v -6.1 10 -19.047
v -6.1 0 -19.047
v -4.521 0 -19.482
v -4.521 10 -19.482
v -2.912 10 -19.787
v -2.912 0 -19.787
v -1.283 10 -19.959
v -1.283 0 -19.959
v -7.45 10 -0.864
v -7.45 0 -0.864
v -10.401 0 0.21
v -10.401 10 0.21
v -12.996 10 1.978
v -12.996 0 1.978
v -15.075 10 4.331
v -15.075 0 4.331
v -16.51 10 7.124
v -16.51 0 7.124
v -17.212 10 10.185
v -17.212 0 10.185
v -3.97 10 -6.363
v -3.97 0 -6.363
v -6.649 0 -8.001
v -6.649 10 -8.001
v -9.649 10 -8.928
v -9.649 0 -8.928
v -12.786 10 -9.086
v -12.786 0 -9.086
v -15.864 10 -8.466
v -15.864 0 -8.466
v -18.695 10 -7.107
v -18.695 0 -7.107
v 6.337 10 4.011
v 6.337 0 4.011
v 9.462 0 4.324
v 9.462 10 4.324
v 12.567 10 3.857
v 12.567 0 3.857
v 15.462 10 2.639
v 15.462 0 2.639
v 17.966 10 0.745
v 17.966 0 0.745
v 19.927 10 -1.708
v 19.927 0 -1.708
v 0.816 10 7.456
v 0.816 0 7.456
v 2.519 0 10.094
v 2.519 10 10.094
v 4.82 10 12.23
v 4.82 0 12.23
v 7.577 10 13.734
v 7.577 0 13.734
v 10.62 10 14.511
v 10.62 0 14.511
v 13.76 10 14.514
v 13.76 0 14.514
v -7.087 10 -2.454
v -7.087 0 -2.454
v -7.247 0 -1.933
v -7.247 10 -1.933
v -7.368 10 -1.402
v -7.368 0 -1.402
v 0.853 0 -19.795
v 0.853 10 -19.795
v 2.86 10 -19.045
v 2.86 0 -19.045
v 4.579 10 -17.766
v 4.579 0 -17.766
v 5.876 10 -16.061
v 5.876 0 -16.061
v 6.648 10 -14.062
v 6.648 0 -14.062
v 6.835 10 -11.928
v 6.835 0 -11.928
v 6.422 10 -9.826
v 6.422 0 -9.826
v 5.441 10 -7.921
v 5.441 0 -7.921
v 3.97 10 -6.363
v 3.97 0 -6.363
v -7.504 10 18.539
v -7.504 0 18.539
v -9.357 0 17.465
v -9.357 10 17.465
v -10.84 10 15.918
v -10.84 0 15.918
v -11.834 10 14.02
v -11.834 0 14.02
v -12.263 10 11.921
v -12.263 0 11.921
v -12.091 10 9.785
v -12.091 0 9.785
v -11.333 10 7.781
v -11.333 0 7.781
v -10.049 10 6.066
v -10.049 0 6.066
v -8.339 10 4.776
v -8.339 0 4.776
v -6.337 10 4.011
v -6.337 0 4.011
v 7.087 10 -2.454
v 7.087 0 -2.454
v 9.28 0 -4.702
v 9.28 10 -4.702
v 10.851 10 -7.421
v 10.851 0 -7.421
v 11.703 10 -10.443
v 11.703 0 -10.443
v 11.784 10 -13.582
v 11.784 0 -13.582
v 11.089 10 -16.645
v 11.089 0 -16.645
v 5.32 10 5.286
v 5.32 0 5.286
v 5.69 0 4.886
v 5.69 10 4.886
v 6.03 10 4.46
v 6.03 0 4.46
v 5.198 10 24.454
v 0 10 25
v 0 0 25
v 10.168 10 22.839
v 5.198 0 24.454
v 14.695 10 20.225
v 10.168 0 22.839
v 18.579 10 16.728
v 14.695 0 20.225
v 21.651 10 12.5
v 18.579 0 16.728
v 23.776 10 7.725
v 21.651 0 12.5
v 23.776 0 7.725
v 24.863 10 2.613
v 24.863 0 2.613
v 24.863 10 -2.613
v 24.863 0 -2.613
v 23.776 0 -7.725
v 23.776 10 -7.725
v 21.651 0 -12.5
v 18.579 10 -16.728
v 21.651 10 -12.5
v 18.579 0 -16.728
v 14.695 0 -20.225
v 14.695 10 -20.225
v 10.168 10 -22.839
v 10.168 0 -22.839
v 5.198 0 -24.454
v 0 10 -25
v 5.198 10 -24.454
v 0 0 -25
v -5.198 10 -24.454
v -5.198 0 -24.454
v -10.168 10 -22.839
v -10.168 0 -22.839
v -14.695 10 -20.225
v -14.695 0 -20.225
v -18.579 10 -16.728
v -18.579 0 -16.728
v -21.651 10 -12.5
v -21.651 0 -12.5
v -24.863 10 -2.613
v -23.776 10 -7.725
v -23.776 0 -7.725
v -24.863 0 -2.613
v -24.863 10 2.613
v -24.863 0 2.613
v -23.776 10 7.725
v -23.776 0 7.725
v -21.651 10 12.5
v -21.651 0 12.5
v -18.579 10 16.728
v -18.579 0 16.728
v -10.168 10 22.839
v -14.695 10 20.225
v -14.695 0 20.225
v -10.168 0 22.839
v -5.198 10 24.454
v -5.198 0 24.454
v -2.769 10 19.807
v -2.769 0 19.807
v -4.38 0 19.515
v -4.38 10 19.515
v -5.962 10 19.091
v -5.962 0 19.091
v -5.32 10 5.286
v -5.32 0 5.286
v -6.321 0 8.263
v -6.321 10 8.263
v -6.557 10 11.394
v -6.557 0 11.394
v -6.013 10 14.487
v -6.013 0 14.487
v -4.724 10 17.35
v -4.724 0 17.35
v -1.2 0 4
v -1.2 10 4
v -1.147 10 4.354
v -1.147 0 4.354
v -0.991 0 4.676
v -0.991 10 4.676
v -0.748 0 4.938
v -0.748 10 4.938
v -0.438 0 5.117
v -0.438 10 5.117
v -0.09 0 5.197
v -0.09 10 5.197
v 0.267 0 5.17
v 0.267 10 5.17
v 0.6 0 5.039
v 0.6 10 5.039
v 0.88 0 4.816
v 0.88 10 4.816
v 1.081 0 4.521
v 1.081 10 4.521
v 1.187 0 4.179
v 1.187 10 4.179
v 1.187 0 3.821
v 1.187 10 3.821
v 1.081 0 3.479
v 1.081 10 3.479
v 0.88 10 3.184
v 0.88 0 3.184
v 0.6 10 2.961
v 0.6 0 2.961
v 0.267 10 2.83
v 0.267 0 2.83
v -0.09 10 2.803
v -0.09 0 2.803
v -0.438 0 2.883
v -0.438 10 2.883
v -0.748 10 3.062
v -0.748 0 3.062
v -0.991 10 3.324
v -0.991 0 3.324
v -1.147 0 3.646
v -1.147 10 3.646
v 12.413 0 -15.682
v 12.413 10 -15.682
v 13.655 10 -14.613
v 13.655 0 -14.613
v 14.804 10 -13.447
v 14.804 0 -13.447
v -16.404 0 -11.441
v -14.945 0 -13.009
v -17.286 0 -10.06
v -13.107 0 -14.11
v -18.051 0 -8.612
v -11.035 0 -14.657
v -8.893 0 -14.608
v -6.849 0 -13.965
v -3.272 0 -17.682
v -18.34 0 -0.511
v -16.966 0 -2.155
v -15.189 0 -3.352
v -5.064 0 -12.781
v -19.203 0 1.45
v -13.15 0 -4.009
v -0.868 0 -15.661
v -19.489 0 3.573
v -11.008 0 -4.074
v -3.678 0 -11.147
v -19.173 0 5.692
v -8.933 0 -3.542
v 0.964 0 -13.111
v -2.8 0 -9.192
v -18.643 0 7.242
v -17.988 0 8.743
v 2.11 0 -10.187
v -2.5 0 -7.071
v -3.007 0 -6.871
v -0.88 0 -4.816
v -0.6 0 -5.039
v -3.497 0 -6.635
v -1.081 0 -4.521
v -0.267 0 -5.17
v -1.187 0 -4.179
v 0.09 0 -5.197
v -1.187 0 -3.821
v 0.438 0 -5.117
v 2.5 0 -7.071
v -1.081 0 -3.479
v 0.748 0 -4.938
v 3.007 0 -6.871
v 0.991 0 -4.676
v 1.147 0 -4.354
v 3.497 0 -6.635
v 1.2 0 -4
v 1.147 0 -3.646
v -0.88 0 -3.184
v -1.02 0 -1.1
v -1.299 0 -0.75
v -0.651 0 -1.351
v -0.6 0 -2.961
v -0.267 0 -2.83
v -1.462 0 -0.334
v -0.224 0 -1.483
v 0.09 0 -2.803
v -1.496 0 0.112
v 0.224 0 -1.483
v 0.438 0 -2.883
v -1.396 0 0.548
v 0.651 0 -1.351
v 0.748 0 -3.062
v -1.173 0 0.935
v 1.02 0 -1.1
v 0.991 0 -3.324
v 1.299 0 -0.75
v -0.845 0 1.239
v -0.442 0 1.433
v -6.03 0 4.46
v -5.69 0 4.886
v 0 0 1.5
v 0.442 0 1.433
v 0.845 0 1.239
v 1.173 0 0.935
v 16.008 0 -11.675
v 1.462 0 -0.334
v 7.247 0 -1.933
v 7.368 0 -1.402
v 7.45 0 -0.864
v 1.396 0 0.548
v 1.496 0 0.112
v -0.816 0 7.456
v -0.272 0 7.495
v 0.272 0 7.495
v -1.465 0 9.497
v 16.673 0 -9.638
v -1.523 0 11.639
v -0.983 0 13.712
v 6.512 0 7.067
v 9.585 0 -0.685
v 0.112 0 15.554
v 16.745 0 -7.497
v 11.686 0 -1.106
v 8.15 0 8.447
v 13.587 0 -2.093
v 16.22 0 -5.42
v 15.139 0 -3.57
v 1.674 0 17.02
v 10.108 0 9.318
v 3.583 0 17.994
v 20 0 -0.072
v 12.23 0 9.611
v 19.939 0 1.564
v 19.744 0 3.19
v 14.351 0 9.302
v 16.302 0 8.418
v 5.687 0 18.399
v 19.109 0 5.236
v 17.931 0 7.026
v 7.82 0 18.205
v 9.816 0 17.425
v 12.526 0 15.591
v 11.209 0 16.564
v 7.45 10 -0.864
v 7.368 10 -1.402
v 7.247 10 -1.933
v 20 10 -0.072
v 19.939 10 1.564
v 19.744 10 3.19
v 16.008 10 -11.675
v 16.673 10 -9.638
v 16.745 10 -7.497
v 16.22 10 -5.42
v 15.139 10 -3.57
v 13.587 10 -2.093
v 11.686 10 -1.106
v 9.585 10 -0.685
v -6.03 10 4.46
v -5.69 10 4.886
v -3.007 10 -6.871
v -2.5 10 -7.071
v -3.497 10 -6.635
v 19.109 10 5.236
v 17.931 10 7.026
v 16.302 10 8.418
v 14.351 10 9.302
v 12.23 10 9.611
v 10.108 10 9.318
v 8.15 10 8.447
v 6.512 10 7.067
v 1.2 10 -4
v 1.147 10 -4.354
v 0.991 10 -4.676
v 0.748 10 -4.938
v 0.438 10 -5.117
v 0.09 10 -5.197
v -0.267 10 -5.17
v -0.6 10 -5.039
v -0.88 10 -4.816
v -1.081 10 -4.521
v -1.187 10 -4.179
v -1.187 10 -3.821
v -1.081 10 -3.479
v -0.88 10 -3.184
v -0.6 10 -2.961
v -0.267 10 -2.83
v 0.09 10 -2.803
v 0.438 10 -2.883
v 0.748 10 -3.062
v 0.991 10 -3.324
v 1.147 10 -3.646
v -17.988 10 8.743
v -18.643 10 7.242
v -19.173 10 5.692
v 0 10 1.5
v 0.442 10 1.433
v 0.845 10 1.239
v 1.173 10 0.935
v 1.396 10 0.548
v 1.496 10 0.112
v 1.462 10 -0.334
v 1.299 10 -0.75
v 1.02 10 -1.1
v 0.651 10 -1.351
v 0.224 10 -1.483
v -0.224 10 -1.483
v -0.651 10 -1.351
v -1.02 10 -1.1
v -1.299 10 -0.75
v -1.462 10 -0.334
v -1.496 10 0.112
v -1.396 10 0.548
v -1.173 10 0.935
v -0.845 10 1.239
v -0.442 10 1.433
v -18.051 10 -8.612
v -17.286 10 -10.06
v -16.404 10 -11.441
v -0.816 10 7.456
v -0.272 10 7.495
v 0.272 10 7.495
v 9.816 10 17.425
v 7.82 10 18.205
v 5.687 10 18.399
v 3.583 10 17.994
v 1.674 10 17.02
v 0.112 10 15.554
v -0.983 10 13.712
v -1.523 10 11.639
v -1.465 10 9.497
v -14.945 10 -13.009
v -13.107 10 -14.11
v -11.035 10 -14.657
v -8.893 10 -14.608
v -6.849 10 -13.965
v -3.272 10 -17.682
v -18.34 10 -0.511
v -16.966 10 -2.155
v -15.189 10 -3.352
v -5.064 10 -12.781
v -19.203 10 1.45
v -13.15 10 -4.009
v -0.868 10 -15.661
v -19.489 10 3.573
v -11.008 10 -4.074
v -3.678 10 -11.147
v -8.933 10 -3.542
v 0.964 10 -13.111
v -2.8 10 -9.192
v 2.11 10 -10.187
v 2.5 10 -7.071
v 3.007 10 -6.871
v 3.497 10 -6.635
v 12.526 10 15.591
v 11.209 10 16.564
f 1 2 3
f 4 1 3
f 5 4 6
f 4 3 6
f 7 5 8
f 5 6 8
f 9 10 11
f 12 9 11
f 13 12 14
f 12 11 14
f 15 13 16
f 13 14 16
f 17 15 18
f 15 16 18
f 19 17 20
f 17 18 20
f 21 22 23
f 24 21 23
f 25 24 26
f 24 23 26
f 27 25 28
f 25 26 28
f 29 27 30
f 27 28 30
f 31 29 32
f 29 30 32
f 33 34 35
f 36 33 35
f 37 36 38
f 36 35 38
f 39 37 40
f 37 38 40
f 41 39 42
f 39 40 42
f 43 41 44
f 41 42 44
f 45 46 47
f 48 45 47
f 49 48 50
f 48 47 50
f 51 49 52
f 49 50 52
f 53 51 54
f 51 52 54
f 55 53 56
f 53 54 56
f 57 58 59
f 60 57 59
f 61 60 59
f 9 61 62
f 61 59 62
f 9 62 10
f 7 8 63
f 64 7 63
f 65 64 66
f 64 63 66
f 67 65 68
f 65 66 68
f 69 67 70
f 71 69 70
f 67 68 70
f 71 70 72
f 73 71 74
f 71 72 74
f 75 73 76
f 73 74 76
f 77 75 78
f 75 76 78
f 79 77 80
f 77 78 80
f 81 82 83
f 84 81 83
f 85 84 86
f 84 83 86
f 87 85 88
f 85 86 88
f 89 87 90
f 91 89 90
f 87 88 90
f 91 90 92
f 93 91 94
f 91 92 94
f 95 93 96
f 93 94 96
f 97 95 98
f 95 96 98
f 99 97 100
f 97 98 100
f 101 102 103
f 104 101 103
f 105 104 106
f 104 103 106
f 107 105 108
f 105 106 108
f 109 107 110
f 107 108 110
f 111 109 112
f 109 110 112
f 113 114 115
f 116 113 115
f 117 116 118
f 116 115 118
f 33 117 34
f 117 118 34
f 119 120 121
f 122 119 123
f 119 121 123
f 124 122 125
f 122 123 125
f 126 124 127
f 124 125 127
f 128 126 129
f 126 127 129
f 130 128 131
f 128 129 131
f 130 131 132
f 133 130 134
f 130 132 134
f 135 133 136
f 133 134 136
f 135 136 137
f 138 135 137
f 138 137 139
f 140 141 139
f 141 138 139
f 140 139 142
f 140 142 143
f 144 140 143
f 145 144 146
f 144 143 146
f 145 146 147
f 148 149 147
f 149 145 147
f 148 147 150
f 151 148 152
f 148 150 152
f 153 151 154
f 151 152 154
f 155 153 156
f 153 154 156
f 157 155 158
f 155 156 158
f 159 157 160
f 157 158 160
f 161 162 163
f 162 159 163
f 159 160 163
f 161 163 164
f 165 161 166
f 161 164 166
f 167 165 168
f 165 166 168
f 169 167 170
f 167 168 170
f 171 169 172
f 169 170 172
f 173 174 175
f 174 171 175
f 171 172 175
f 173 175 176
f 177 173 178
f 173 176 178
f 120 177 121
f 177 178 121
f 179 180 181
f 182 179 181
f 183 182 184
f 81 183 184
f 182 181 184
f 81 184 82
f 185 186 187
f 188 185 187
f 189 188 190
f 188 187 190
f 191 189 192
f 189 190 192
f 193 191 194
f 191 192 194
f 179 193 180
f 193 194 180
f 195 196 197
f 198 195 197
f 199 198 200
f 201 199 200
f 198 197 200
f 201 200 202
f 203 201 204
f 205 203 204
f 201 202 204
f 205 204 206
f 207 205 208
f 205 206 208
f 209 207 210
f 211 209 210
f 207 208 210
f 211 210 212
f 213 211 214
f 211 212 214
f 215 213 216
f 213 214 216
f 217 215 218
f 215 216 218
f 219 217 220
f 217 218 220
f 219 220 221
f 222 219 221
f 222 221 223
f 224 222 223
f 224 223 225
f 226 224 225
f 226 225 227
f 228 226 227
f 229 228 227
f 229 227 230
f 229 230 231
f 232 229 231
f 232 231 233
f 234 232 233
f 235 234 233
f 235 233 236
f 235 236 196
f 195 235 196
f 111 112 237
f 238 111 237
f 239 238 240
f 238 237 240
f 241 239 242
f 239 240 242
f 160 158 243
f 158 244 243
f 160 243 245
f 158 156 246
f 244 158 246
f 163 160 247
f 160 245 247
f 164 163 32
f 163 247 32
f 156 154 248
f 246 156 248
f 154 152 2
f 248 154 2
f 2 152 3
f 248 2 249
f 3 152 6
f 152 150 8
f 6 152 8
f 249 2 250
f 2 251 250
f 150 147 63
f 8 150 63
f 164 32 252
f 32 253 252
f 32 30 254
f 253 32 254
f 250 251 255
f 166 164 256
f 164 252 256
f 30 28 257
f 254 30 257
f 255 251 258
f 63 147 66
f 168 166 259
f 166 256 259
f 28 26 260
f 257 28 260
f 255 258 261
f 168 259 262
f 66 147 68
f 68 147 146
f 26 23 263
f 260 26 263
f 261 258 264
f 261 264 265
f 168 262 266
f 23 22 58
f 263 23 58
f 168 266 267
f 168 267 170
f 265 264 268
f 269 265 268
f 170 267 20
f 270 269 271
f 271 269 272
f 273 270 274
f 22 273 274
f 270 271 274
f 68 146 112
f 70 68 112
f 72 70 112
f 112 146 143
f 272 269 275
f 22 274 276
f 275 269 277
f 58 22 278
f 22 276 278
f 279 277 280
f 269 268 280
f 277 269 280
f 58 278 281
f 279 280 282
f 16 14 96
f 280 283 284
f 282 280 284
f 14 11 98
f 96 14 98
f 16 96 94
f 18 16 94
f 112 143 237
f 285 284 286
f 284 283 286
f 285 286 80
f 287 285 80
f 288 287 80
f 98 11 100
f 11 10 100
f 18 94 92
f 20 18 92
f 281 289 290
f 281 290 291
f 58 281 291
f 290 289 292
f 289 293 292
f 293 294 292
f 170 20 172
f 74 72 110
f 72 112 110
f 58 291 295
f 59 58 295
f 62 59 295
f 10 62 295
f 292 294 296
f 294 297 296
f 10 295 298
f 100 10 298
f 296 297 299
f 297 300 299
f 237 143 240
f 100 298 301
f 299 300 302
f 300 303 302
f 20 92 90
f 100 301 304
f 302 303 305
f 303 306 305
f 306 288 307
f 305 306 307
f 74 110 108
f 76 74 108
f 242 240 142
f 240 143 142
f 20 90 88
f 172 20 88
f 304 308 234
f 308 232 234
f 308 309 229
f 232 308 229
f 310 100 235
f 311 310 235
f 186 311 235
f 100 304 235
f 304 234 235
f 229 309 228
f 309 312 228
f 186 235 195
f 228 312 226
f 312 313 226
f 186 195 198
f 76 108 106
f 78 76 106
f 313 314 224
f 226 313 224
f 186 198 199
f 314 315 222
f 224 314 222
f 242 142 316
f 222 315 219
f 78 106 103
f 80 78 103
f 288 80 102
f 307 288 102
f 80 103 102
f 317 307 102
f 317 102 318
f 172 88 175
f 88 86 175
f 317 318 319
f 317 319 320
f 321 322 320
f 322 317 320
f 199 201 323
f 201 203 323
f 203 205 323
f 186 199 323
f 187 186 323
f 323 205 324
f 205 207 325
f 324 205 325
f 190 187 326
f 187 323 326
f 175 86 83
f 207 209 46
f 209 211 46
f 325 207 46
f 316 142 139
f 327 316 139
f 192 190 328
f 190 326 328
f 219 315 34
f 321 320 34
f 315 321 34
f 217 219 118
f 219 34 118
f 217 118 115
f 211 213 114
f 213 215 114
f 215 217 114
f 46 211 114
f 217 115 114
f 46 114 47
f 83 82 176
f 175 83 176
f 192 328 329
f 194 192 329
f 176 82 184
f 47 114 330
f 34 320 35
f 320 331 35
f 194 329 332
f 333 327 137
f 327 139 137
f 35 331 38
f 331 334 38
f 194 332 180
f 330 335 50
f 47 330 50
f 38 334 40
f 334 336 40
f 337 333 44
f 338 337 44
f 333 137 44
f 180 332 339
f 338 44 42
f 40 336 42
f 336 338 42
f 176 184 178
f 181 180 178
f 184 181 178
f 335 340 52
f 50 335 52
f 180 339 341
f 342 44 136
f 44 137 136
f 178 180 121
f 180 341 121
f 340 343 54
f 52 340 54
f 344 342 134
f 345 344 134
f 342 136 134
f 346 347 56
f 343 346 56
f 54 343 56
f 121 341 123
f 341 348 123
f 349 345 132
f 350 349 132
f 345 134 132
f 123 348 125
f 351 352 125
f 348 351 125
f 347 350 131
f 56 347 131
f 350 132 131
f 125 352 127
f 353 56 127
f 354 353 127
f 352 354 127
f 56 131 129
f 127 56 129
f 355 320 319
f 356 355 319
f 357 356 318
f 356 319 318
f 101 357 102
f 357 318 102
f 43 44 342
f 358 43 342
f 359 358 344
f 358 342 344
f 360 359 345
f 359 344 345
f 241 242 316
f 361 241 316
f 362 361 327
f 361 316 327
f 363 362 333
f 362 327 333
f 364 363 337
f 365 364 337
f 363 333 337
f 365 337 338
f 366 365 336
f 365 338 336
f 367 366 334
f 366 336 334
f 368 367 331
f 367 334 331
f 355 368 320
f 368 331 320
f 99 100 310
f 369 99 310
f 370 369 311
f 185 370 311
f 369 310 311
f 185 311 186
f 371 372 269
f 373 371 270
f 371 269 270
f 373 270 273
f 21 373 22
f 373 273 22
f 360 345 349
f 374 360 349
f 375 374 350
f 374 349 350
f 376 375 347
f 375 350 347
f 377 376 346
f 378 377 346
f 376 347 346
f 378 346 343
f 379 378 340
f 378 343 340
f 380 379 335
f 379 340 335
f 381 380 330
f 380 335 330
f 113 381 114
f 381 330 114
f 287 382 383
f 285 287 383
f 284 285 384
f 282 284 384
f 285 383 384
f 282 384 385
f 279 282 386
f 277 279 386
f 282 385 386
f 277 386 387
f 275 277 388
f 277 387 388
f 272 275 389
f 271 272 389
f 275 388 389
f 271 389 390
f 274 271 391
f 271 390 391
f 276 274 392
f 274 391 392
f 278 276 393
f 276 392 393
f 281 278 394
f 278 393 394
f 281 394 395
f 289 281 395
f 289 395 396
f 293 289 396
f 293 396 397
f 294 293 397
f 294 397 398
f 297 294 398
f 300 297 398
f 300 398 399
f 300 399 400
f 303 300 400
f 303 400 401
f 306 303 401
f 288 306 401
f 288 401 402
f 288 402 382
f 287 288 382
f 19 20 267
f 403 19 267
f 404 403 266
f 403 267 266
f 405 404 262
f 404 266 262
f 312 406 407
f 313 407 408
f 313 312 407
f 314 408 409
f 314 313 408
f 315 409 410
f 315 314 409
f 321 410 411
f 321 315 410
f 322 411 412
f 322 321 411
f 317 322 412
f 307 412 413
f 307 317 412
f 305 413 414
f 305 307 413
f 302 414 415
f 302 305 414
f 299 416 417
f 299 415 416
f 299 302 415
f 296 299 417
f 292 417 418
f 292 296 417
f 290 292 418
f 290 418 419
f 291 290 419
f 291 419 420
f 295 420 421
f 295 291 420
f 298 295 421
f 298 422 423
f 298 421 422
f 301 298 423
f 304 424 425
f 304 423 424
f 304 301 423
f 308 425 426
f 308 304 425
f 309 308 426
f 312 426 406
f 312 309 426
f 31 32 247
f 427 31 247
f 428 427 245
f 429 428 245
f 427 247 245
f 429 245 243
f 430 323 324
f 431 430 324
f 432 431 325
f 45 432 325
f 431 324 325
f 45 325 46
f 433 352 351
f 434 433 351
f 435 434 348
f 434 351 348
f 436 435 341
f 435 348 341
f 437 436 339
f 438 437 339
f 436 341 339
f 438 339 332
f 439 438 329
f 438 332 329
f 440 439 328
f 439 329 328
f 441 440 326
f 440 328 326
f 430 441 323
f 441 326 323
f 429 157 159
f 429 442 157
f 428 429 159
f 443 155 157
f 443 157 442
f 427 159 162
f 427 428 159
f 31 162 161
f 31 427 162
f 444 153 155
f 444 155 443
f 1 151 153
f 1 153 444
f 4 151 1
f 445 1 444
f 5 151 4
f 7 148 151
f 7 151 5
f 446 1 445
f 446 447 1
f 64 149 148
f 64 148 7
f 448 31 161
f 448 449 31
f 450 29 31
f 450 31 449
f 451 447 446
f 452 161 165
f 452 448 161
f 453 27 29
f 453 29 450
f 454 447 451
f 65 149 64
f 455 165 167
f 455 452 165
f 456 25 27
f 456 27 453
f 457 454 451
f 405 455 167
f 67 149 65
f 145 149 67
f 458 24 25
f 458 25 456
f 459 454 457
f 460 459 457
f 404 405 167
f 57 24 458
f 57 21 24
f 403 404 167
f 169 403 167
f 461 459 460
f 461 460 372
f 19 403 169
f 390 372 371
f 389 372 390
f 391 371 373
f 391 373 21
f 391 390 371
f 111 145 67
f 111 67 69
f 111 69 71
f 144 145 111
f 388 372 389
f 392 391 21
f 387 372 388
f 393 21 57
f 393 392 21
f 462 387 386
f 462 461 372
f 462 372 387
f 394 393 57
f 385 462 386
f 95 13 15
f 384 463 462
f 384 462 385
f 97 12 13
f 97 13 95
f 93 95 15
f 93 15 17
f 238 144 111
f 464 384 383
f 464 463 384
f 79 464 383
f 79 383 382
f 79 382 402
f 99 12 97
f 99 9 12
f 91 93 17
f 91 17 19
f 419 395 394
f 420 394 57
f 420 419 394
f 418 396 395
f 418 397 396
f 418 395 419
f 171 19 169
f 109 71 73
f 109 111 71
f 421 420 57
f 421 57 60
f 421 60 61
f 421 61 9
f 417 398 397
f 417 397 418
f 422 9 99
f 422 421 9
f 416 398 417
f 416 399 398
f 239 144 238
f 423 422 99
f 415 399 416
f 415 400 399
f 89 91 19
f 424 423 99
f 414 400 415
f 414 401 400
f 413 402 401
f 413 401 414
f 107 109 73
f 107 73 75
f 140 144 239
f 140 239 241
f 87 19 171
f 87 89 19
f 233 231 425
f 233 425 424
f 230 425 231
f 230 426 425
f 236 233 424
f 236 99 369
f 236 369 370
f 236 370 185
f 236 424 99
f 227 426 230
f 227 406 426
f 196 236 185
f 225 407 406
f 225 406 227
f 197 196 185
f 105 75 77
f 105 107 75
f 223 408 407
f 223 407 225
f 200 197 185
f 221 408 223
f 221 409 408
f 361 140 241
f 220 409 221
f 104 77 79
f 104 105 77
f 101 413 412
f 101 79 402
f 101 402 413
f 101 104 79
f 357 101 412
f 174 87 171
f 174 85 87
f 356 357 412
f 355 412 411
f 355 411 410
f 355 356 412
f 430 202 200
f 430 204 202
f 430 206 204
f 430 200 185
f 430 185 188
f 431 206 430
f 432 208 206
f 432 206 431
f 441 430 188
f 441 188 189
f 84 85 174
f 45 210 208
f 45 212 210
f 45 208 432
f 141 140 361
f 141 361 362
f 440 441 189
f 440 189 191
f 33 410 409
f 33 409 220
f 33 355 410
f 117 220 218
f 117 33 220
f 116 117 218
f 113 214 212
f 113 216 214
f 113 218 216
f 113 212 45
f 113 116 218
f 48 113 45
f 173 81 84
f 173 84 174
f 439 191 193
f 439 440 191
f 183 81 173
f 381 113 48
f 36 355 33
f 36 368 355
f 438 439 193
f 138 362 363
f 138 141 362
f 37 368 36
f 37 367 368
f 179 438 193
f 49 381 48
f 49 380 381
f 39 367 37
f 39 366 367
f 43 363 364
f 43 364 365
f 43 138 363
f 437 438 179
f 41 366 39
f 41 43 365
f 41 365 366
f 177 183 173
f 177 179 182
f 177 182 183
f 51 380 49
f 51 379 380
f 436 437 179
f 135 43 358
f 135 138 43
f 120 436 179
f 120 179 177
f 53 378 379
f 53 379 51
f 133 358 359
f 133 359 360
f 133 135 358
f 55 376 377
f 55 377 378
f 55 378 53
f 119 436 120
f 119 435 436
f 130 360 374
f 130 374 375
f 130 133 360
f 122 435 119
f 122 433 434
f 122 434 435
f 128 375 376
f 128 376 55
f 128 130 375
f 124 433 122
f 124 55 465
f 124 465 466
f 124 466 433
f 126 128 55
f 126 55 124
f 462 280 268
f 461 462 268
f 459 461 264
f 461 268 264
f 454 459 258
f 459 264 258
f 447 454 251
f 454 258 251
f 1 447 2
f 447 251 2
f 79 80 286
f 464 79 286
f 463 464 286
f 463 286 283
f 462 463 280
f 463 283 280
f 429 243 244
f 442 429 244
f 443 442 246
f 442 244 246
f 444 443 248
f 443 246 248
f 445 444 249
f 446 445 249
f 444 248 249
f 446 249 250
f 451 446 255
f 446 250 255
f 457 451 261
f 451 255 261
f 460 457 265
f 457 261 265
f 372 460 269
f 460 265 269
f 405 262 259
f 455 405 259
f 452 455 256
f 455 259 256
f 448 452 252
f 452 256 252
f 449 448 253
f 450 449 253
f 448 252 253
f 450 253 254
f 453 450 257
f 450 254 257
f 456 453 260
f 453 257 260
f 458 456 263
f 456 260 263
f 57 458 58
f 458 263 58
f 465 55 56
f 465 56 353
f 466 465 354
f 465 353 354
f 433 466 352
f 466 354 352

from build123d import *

# Parameters (mm, degrees)
BASE_REFERENCE_SKETCH_R       = 25
BASE_REFERENCE_SKETCH_R_2     = 1.5
BASE_WHEEL_EXTRUDE_DEPTH      = 10
SPOKES_CIRCULAR_PATTERN_COUNT = 7
M2_CLEARANCE_HOLE1_D          = 2.4
CIRPATTERN1_COUNT             = 2


with BuildPart() as part:
    # Base Reference Sketch → Base Wheel Extrude (new body)
    with BuildSketch(Plane(origin=(0, 0, 0), x_dir=(1, 0, 0), z_dir=(0, 1, 0))):
        with Locations(Location((0, 0, 0), (0, 0, 270))):
            Circle(BASE_REFERENCE_SKETCH_R)
        with BuildLine():
            ThreePointArc((-6.099694515, 19.047144847), (11.877442501, -16.091188882), (-16.404494382, 11.440828819))
            ThreePointArc((-16.404494382, 11.440828819), (-7.848653173, 14.358553237), (-2.5, 7.071067812))
            ThreePointArc((-2.5, 7.071067812), (0, -7.5), (2.5, 7.071067812))
            ThreePointArc((2.5, 7.071067812), (0.127377259, 14.442993729), (-6.099694515, 19.047144847))
        make_face(mode=Mode.SUBTRACT)
        with Locations(Location((0, 0, 0), (0, 0, 270))):
            Circle(BASE_REFERENCE_SKETCH_R_2, mode=Mode.SUBTRACT)
    base_wheel_extrude = extrude(amount=BASE_WHEEL_EXTRUDE_DEPTH)

    # Spokes Circular Pattern: Base Wheel Extrude ×7 about axis
    spokes_circular_pattern_axis = Axis((0, 0, 0), (0, 1, 0))
    for i in range(1, SPOKES_CIRCULAR_PATTERN_COUNT):
        add(base_wheel_extrude.rotate(spokes_circular_pattern_axis, i * 360 / SPOKES_CIRCULAR_PATTERN_COUNT))

    # M2 Clearance Hole1 (through all)
    with Locations(Plane(origin=(0, 0, 0), x_dir=(-1, 0, 0), z_dir=(0, -1, 0))):
        with Locations((0, 4)):
            m2_clearance_hole1 = Hole(M2_CLEARANCE_HOLE1_D / 2)

    # CirPattern1: M2 Clearance Hole1 ×2 about axis
    cirpattern1_axis = Axis((0, 0, 0), (0, 1, 0))
    for i in range(1, CIRPATTERN1_COUNT):
        add(m2_clearance_hole1.rotate(cirpattern1_axis, i * 360 / CIRPATTERN1_COUNT), mode=Mode.SUBTRACT)


solid = part.part
